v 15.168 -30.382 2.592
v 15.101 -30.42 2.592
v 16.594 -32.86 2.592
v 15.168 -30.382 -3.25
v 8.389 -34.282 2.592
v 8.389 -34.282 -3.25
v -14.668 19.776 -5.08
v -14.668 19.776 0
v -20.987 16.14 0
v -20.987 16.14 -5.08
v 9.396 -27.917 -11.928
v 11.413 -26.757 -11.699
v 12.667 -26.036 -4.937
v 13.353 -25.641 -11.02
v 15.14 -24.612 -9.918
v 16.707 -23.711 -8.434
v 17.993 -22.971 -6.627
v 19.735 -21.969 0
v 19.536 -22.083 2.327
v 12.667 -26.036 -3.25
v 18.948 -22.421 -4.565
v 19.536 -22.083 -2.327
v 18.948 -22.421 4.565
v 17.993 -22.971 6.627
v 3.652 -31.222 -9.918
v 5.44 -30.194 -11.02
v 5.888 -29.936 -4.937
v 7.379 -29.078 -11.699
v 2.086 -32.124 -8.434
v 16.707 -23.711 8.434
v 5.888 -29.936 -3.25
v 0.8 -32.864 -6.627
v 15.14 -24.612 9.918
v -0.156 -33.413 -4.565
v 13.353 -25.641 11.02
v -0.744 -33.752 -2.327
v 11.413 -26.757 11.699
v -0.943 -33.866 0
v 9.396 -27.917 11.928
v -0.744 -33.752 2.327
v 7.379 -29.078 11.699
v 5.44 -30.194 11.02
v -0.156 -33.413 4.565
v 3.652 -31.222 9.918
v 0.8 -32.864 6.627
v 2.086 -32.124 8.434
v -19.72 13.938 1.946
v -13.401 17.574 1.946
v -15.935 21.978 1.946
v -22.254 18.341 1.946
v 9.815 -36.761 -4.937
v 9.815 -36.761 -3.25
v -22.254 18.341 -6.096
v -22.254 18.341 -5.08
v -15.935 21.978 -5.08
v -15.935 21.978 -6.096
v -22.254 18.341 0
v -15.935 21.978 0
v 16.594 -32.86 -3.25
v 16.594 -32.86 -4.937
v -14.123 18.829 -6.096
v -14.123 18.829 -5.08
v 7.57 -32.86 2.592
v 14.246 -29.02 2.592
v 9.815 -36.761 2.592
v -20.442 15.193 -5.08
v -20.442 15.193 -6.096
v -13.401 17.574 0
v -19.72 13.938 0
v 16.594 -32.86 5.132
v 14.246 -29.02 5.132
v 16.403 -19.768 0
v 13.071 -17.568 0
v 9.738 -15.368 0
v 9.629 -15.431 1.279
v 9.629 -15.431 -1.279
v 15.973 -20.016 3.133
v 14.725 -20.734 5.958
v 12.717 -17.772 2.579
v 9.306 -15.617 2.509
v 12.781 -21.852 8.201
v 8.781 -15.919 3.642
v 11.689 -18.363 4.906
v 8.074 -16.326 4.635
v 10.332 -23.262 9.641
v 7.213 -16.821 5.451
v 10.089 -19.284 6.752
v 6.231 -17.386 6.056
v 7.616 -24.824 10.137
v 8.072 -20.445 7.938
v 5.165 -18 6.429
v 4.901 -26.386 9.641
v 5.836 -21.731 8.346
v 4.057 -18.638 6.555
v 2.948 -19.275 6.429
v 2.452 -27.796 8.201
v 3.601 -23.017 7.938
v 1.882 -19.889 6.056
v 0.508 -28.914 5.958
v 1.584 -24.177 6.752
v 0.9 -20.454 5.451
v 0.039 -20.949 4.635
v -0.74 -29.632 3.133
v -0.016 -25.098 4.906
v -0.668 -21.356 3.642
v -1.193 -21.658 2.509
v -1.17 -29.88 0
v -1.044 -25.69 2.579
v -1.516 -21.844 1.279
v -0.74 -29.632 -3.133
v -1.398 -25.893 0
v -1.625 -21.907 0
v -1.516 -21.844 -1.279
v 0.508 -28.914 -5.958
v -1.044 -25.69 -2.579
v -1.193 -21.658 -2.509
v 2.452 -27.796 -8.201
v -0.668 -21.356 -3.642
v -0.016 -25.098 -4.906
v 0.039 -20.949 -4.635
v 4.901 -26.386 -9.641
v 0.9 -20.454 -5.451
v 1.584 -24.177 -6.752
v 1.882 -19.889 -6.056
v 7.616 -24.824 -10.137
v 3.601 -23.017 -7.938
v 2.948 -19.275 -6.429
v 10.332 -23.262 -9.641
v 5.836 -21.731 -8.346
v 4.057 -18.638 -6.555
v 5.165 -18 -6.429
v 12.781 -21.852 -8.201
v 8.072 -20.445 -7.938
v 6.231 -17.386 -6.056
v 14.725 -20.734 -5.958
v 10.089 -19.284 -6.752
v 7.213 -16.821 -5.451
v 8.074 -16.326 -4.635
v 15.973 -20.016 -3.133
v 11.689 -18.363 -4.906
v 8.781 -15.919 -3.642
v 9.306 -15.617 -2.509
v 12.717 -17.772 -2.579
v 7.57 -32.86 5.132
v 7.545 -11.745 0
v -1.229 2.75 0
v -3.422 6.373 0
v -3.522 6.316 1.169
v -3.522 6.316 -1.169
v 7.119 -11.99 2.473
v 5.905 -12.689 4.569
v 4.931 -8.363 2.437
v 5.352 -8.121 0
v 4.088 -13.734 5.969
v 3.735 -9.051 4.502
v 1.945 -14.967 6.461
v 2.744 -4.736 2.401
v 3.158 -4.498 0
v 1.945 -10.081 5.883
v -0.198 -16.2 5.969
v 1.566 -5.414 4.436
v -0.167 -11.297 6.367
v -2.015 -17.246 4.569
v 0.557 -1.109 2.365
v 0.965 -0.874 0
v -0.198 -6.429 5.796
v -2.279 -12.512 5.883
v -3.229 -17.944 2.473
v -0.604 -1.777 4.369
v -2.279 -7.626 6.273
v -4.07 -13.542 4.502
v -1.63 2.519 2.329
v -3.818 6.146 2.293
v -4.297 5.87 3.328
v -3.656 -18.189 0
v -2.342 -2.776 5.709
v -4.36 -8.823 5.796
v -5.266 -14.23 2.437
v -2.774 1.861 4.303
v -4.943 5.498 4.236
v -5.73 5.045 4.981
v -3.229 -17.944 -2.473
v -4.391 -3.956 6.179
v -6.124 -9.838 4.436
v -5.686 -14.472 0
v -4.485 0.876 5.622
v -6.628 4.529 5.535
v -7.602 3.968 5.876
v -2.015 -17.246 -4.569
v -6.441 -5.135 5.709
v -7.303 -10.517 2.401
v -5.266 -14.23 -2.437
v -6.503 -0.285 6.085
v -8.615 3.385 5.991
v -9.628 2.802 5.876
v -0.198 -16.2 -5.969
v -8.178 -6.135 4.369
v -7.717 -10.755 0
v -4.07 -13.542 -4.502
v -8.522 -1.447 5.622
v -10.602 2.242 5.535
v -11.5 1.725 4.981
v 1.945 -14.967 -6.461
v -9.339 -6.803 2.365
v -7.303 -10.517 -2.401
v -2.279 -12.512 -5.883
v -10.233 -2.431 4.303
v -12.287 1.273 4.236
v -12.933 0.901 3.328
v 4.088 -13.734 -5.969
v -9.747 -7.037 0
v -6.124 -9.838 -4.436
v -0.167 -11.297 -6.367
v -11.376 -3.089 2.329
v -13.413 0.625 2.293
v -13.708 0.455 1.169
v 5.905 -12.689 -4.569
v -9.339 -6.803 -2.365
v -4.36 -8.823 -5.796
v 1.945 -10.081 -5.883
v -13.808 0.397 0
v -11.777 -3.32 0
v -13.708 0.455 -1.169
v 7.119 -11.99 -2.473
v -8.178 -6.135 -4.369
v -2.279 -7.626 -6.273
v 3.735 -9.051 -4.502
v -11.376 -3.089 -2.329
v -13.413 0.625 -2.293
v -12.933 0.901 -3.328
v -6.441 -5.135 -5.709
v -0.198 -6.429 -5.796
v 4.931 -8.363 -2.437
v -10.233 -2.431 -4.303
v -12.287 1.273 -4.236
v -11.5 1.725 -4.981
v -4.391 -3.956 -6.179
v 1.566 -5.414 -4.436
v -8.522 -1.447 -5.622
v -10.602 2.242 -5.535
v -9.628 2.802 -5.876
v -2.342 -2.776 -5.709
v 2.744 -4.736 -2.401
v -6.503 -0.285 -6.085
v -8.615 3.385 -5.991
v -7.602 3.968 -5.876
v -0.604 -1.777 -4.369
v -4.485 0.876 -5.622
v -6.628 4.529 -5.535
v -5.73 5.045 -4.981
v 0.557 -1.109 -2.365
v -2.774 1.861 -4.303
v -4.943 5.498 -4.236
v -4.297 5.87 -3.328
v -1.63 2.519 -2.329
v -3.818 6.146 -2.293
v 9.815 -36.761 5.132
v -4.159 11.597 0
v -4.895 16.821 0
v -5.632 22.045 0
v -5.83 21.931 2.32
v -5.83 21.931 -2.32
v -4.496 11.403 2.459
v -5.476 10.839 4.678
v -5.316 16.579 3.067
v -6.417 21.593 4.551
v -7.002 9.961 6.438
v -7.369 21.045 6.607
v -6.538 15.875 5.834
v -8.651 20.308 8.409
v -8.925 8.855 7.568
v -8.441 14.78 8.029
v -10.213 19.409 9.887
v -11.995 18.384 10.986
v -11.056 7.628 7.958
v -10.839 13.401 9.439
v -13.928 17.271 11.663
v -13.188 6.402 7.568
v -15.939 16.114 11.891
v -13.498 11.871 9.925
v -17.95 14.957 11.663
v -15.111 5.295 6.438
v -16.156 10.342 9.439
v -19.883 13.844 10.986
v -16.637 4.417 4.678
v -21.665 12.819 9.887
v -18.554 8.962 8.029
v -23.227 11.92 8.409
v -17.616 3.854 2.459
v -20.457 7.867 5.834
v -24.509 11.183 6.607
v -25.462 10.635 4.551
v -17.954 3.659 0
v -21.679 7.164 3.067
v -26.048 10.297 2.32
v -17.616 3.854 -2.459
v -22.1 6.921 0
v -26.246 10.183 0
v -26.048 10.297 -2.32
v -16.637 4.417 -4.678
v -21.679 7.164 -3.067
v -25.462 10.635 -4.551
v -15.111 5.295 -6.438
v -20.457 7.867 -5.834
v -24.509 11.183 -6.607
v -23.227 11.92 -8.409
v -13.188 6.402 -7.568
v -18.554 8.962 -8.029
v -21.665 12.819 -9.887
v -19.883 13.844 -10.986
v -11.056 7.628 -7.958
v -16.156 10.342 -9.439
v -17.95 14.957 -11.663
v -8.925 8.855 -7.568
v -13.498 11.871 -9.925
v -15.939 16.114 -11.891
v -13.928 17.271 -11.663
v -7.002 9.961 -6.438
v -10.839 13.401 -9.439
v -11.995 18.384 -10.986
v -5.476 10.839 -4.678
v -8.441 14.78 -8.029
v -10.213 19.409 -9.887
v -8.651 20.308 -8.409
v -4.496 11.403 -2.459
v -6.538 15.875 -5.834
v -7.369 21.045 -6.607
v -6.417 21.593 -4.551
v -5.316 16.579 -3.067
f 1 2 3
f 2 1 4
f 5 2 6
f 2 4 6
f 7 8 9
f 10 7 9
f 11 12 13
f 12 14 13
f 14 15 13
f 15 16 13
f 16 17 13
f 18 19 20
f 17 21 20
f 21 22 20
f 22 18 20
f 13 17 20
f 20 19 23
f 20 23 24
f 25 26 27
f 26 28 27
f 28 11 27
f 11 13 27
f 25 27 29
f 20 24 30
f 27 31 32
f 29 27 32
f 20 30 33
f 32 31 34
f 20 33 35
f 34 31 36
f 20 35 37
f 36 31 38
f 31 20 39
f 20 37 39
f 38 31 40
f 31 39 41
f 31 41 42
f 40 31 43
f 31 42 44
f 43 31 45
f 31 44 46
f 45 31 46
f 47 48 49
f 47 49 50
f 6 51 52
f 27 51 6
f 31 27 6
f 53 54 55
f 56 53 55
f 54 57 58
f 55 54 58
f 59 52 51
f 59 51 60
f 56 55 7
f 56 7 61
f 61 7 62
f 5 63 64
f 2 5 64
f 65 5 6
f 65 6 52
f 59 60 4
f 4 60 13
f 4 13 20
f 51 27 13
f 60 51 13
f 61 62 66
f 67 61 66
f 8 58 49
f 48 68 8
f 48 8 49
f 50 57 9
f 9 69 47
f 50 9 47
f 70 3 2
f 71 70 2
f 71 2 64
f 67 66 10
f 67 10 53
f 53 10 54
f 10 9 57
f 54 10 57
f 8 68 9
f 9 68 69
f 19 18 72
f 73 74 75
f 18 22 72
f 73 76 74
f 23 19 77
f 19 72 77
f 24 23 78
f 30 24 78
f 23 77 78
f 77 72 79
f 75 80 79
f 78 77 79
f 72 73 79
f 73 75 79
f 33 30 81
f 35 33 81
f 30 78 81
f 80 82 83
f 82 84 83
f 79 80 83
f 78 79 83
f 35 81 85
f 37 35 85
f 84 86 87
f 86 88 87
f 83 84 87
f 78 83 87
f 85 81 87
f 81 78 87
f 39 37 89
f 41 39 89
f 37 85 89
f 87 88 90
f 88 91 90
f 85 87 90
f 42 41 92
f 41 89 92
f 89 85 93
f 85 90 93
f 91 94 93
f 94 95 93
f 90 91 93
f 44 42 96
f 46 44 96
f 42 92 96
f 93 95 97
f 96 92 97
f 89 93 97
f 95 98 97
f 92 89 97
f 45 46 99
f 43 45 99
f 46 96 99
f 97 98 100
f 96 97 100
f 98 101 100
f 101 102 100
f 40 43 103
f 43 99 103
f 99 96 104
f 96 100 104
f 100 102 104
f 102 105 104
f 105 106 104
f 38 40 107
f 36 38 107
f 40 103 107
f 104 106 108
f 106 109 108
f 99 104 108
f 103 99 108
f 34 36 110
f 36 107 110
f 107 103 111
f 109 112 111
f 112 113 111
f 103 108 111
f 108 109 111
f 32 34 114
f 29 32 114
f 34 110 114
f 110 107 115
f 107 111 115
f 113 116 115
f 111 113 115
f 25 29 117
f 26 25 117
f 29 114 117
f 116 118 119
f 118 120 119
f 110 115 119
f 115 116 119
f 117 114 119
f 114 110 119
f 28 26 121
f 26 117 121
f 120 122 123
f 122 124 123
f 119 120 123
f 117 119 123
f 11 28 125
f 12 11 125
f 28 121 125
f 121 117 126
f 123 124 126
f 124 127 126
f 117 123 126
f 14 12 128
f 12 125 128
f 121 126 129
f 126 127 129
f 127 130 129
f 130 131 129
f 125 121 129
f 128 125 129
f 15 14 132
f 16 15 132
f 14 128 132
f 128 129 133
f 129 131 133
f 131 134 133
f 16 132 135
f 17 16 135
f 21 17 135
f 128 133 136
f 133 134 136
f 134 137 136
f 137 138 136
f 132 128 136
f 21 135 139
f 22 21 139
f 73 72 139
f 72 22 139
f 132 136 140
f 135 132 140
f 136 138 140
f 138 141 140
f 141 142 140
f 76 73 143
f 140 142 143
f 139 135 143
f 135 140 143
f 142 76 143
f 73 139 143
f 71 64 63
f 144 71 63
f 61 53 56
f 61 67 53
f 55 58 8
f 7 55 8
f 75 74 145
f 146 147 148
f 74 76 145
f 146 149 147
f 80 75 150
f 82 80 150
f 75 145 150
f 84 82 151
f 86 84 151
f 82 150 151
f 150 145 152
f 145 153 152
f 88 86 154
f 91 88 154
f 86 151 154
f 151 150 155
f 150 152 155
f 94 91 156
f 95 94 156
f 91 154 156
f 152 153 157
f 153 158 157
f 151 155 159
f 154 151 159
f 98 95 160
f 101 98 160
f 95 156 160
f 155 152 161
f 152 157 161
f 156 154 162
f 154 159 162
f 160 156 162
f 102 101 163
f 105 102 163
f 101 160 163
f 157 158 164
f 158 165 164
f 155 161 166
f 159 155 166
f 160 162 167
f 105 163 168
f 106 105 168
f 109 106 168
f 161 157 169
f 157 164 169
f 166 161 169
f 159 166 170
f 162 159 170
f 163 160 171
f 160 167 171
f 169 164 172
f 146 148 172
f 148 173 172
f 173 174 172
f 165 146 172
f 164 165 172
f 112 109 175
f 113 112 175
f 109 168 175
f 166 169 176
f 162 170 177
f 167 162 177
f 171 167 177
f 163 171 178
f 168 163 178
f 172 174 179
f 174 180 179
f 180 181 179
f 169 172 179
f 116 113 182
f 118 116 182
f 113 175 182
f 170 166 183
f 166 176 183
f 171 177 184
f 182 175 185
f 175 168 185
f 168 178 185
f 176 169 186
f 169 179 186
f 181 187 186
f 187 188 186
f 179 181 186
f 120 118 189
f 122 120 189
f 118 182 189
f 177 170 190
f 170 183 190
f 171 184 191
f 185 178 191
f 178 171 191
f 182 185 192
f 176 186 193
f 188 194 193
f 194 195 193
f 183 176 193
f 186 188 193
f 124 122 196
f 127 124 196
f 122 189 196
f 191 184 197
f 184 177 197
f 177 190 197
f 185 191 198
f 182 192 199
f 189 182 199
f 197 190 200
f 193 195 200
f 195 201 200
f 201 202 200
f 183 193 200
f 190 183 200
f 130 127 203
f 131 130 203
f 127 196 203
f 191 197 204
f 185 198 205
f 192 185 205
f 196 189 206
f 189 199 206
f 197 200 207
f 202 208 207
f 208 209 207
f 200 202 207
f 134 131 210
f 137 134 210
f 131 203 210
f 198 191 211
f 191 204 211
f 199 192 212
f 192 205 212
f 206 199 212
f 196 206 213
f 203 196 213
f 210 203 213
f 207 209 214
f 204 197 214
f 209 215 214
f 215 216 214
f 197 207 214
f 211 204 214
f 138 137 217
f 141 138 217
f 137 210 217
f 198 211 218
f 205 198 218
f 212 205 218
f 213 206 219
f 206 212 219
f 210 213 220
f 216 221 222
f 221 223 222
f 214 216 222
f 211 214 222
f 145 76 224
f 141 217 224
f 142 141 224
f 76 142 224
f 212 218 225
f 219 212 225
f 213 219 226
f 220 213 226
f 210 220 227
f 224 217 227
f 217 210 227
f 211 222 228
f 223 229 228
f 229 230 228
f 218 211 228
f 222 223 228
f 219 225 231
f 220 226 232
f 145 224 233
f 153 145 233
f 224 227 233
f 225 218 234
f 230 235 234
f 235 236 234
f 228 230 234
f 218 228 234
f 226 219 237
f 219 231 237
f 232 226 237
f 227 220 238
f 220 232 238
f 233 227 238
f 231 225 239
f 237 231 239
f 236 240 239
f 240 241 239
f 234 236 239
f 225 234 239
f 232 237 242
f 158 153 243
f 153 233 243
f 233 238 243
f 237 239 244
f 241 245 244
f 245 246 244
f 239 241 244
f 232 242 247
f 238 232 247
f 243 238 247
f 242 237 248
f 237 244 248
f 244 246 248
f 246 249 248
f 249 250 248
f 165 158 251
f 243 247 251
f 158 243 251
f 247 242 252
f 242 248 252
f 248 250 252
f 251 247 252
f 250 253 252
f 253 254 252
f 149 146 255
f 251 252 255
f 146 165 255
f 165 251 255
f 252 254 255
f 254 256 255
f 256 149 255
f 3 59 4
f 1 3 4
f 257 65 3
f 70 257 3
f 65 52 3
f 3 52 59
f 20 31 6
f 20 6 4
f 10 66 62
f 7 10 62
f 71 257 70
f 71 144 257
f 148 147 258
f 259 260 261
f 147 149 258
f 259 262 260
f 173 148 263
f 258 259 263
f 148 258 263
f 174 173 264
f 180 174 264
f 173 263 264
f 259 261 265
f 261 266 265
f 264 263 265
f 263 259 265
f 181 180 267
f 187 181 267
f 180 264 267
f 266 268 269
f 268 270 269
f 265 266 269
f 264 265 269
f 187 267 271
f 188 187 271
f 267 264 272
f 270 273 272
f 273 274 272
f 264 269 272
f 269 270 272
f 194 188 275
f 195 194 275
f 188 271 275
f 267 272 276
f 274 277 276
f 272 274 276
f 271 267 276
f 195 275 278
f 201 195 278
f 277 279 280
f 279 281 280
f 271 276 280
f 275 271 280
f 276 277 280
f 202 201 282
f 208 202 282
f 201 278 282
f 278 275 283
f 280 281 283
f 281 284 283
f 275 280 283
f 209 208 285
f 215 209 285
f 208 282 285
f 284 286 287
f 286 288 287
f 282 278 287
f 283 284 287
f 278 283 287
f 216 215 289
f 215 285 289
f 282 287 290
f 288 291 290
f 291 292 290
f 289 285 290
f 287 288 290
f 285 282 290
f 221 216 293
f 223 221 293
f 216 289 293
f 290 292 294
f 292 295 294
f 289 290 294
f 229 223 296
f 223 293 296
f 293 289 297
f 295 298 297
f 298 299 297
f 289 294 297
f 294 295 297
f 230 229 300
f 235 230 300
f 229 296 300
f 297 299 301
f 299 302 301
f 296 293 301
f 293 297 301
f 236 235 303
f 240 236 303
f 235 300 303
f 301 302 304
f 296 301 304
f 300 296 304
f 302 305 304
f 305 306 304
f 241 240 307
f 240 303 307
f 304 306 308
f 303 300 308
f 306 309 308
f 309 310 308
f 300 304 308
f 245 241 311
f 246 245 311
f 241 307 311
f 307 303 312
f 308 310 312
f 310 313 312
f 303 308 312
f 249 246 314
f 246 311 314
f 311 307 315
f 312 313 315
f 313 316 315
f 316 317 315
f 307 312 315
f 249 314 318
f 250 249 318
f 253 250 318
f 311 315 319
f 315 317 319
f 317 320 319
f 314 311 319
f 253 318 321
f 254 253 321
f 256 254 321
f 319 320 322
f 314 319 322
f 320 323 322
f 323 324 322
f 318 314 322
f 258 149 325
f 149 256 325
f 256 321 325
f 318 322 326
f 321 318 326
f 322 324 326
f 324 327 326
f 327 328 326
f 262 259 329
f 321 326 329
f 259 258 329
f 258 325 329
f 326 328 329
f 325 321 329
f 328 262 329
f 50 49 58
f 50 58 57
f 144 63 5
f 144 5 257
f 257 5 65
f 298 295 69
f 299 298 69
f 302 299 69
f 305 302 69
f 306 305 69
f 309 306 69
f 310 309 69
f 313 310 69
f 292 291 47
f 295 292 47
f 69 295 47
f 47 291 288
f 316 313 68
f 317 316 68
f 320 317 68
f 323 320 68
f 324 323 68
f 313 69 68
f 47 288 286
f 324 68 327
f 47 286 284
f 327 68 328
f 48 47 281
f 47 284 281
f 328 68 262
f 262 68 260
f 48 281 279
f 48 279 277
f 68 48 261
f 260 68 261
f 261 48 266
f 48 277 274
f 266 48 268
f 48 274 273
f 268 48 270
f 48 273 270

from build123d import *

# Parameters (mm, degrees)
F2_W      = 7.8210735228
F2_H      = 1.6869045794
F3_DEPTH  = 7.874
F5_DEPTH  = 5.842
F7_DEPTH  = 2.54
F8_W      = 7.2907346766
F8_H      = 1.9461095799
F9_DEPTH  = 5.08
F11_DEPTH = 5.08
F13_DEPTH = 1.016


with BuildPart() as f1:
    # F0 (on Top) → F1 (revolve)
    with BuildSketch(Plane.XY):
        Polygon((9.738479662, -15.3682792879), (-3.4222373906, 6.3731869042), (-5.6319757583, 22.0445621817), (-15.939033498, 16.113988769), (9.3961827512, -27.9174258268), (19.7350436062, -21.9685532335), align=None)
    revolve(axis=Axis((-3.2714253734, -5.9017185289, 0), (0.4987248594, -0.8667603559, 0)))

    # F2 (on face) → F3 (join)
    with BuildSketch(Plane(origin=(14.4050829924, -25.0353569234, 0), x_dir=(0.8667603559, 0.4987248594, 0), z_dir=(0.4987248594, -0.8667603559, 0))):
        with Locations((-5.9160405071, -4.0938784368)):
            Rectangle(F2_W, F2_H)
    extrude(amount=F3_DEPTH)

    # F4 (on face) → F5 (join)
    with BuildSketch(Plane.XY.offset(-3.2504261471)):
        Polygon((15.1675006282, -30.3816657685), (8.3885041579, -34.2822295615), (9.8147549245, -36.7609863326), (16.5937513949, -32.8604225396), align=None)
    extrude(amount=F5_DEPTH)

    # F6 (on face) → F7 (join)
    with BuildSketch(Plane.XY.offset(2.5915738529)):
        Polygon((9.8147549245, -36.7609863326), (16.5937513949, -32.8604225396), (14.2455248972, -29.0196318337), (7.5704112418, -32.8604225396), align=None)
    extrude(amount=F7_DEPTH)

    # F8 (on face) → F9 (join)
    with BuildSketch(Plane(origin=(-10.9301332567, 18.9960576725, 0), x_dir=(-0.8667603559, -0.4987248594, 0), z_dir=(-0.4987248594, 0.8667603559, 0))):
        with Locations((6.4960370073, 0.9730547899)):
            Rectangle(F8_W, F8_H)
    extrude(amount=F9_DEPTH)

    # F10 (on face) → F11 (join)
    with BuildSketch(Plane(origin=(0, 0, 0), x_dir=(1, 0, 0), z_dir=(0, 0, -1))):
        Polygon((-22.2538227827, -18.3414298242), (-15.9345029994, -21.9775004507), (-14.6677418565, -19.7759291467), (-20.9870616398, -16.1398585201), align=None)
    extrude(amount=F11_DEPTH)

    # F12 (on face) → F13 (join)
    with BuildSketch(Plane(origin=(0, 0, -5.08), x_dir=(1, 0, 0), z_dir=(0, 0, -1))):
        Polygon((-22.2538227827, -18.3414298242), (-15.9345029994, -21.9775004507), (-14.1230425955, -18.8292674424), (-20.4423623788, -15.1931968158), align=None)
    extrude(amount=F13_DEPTH)


solid = f1.part
